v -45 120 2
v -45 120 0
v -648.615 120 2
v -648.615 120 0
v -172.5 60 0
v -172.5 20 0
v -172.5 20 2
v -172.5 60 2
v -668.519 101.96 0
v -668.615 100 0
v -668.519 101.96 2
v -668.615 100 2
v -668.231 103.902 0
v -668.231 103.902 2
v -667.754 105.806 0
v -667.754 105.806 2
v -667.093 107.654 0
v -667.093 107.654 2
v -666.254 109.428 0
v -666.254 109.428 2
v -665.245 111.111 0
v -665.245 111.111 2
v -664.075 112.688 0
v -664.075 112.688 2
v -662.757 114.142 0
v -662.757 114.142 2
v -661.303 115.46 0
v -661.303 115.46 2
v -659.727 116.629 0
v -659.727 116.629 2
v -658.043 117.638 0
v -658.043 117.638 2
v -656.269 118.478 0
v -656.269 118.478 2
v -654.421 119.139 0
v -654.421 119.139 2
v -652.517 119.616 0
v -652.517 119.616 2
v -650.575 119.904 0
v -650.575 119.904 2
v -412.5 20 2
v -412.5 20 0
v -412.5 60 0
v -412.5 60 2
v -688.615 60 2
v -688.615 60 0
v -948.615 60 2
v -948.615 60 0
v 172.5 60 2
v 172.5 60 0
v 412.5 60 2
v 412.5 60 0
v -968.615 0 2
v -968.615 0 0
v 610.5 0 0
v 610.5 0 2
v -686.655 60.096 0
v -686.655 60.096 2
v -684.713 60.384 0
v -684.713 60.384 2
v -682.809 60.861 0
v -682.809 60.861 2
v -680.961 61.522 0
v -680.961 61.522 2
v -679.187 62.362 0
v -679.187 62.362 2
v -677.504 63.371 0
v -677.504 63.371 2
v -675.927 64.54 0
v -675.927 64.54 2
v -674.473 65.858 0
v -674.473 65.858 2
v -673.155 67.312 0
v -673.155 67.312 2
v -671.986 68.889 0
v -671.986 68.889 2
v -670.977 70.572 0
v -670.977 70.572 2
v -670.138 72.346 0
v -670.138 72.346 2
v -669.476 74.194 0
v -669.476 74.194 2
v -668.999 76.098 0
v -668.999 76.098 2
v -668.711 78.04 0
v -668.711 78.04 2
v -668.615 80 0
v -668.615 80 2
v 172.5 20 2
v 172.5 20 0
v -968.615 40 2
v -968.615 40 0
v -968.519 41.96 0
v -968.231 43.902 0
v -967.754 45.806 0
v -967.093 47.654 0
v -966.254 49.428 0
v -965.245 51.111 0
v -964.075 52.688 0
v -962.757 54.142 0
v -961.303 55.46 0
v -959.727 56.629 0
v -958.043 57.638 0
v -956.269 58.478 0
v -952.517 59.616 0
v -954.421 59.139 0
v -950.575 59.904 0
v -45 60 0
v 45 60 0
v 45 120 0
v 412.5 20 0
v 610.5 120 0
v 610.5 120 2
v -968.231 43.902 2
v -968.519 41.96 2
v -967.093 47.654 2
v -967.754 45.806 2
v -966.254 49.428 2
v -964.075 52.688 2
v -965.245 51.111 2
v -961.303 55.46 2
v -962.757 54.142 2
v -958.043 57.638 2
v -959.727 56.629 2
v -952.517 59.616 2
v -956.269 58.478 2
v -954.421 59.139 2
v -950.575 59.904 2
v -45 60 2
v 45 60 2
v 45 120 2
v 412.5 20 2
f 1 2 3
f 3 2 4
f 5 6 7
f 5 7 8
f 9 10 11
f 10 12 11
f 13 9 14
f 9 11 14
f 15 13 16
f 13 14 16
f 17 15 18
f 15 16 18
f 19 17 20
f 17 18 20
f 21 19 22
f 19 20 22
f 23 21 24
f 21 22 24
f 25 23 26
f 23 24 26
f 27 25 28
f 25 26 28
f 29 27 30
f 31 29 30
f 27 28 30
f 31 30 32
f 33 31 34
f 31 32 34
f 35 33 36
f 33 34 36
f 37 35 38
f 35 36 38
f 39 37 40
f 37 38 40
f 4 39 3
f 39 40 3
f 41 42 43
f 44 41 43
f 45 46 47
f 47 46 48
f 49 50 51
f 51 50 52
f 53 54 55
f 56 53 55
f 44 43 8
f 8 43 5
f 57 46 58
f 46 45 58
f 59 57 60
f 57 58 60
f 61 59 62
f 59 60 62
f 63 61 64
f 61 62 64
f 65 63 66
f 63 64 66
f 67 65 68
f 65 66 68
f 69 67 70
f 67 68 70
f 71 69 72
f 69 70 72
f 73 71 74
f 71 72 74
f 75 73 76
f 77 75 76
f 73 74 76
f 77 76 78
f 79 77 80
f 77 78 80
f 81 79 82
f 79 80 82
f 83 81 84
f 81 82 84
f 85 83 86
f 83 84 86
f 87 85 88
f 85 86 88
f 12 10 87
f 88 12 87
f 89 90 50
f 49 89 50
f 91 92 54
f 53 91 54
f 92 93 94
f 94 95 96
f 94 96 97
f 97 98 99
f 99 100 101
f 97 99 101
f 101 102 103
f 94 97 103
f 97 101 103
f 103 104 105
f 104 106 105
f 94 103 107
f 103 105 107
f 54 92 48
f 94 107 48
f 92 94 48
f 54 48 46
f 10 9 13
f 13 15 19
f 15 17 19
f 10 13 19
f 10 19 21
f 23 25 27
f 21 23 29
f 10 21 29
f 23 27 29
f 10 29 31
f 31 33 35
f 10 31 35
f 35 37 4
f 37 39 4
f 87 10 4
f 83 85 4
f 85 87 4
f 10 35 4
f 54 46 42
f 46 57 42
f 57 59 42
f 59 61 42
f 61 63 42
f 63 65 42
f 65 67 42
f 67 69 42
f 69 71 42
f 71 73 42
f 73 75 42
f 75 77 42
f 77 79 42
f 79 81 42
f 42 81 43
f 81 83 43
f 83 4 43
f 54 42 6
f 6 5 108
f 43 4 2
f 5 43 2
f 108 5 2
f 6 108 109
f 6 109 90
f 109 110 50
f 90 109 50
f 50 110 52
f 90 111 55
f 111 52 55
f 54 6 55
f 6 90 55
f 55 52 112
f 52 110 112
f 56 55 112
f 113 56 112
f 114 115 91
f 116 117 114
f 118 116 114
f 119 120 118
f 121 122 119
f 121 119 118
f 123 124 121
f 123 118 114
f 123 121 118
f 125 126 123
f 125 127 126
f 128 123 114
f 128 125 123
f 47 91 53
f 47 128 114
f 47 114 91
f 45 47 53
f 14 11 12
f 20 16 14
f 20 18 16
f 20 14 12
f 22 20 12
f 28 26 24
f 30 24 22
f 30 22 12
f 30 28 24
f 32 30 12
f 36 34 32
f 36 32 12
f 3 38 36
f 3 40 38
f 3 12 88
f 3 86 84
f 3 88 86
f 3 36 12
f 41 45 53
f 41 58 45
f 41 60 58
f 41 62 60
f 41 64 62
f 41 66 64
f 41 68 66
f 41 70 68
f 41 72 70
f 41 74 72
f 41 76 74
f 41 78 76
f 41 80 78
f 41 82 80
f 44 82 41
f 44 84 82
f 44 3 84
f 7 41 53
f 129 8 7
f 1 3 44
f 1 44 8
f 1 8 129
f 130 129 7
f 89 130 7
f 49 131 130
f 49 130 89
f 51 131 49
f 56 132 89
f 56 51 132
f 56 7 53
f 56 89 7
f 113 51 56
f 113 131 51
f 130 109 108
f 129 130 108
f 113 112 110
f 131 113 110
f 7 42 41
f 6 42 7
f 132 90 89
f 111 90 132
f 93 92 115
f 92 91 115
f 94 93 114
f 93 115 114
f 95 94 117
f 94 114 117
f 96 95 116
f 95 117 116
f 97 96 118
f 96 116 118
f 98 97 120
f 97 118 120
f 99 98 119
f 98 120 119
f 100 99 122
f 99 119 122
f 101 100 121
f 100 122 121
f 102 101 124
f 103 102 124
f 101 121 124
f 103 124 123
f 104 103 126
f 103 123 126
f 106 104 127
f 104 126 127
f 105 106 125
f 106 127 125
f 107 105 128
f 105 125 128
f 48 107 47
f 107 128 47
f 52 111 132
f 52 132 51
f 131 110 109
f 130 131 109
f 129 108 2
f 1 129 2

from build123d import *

# Parameters (mm, degrees)
ESQUISSE1_W        = 240
ESQUISSE1_H        = 40
BOSS_EXTRU_1_DEPTH = 2
CONG_1_R           = 20


with BuildPart() as part:
    # Esquisse1 → Boss.-Extru.1 (new body)
    with BuildSketch(Plane.XY):
        Polygon((-610.5, 0), (610.5, 0), (610.5, 120), (45, 120), (45, 60), (-45, 60), (-45, 120), (-610.5, 120), (-668.615113653, 120), (-668.615113653, 60), (-968.615113653, 60), (-968.615113653, 0), align=None)
        with Locations((292.5, 40)):
            Rectangle(ESQUISSE1_W, ESQUISSE1_H, mode=Mode.SUBTRACT)
        with Locations((-292.5, 40)):
            Rectangle(ESQUISSE1_W, ESQUISSE1_H, mode=Mode.SUBTRACT)
    extrude(amount=BOSS_EXTRU_1_DEPTH)

    # Congé1
    cong_1_edges = [part.edges().sort_by_distance(p)[0] for p in [
        (-968.615113653, 60, 1),
        (-668.615113653, 60, 1),
        (-668.615113653, 120, 1),
    ]]
    fillet(cong_1_edges, radius=CONG_1_R)


solid = part.part
